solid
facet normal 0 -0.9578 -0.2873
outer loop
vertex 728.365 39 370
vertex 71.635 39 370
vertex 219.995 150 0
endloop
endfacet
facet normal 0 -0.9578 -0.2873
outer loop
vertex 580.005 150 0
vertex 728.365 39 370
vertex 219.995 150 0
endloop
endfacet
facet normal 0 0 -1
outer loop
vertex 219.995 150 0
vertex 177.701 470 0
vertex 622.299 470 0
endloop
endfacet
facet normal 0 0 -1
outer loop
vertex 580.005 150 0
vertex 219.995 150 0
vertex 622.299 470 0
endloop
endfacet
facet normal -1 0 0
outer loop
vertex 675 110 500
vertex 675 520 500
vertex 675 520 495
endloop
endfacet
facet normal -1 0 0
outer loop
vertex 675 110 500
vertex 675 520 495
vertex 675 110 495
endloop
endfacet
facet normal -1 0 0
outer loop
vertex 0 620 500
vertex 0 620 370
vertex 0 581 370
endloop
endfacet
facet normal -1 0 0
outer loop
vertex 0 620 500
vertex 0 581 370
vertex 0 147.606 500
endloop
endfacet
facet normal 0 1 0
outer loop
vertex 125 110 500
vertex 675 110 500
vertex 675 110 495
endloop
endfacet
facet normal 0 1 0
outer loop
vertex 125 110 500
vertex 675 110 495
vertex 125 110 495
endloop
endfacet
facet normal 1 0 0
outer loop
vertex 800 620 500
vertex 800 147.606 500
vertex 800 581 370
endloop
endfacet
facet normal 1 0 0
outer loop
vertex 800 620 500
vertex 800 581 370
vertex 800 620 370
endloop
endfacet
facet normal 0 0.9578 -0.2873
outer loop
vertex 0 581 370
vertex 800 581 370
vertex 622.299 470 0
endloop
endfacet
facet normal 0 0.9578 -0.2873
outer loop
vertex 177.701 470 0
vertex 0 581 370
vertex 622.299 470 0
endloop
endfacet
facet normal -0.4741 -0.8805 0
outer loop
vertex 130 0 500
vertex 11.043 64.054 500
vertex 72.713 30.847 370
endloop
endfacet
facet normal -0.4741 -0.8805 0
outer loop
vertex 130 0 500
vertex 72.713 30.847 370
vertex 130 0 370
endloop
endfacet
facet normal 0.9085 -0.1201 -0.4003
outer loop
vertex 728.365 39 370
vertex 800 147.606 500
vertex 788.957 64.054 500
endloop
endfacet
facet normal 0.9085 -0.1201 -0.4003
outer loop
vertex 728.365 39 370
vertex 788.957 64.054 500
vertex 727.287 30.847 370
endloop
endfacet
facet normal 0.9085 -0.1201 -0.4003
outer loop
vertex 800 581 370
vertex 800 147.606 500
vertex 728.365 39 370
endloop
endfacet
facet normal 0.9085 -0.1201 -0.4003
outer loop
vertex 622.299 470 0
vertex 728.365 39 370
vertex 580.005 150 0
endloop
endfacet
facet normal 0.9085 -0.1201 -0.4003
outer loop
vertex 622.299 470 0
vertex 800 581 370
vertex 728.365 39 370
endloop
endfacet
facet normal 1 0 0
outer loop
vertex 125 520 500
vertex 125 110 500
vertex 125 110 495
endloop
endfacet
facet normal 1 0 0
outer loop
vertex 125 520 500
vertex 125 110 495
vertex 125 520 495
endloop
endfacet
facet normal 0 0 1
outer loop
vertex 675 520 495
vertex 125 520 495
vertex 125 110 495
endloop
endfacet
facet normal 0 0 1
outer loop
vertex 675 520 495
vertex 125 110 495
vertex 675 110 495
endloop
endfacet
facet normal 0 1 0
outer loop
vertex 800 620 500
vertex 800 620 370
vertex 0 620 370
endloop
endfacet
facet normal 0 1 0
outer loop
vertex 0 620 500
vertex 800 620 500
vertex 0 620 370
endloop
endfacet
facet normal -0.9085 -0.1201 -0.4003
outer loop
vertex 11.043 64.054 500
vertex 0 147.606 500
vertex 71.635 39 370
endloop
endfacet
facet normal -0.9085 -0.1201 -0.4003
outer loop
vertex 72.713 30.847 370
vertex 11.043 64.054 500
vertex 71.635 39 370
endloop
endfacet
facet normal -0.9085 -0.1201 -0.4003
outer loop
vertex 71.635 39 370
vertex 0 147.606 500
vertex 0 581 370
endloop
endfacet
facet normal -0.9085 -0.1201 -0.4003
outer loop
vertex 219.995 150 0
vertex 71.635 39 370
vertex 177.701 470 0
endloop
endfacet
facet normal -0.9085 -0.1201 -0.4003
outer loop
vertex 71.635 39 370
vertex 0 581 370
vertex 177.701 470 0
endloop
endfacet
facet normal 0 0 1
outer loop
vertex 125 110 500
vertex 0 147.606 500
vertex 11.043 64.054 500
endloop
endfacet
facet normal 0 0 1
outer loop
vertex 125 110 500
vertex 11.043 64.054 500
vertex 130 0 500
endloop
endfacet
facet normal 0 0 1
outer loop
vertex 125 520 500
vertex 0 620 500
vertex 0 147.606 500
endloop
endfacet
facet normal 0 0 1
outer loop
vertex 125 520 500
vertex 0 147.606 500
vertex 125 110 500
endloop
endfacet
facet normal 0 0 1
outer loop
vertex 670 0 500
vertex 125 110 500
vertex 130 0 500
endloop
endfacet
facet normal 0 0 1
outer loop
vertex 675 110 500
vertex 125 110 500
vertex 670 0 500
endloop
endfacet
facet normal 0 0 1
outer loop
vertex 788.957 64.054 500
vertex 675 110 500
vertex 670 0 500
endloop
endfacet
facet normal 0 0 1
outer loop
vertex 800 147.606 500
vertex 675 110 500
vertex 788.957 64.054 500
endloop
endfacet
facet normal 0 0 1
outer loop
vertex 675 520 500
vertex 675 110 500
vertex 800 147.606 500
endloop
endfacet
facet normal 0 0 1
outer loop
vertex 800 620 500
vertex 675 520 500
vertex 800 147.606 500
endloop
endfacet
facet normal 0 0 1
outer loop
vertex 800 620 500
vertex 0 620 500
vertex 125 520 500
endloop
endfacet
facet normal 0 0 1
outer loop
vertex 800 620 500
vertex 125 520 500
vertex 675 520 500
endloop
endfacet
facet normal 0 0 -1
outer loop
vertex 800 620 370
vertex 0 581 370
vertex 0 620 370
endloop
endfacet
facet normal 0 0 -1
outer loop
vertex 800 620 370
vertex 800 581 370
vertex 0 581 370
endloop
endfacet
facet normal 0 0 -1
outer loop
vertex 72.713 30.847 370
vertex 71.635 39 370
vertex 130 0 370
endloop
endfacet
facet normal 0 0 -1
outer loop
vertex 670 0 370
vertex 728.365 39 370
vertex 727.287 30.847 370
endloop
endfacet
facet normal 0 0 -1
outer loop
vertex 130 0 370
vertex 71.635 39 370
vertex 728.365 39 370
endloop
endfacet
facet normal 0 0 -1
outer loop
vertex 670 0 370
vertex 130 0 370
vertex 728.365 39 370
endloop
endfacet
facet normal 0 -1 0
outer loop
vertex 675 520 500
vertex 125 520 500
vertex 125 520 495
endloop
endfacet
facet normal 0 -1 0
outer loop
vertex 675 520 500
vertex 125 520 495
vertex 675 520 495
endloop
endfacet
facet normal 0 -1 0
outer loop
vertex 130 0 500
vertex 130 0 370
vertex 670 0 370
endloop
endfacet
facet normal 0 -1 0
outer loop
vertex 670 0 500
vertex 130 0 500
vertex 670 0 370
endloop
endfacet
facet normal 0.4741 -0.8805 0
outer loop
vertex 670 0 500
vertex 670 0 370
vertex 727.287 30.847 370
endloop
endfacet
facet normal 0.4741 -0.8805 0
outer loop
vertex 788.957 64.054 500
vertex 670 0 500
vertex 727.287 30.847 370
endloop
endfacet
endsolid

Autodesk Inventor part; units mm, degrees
ref_plane "YZ Plane" through (0, 0, 0) normal (1, 0, 0) x (0, 1, 0)
ref_plane "XZ Plane" through (0, 0, 0) normal (0, 1, 0) x (-1, 0, 0)
ref_plane "XY Plane" through (0, 0, 0) normal (0, 0, 1) x (1, 0, 0)
sketch "Sketch1" plane through (0, 0, 0) normal (0, 0, 1) x (1, 0, 0)
  line L0 (130, 0) -> (670, 0)
  line L1 (800, 70) -> (800, 620)
  line L2 (800, 620) -> (0, 620)
  line L3 (0, 620) -> (0, 70)
  line L4 (0, 70) -> (130, 0)
  line L5 (670, 0) -> (800, 70)
  line L6 (400, 620) -> (400, 0) construction
  point P0 (0, 0)
  dimension "d0" = 800
  dimension "d1" = 620
  dimension "d2" = 550
  dimension "d3" = 550
  dimension "d4" = 270
  dimension "d5" = 270
  dimension "d6" = 70
  dimension "d7" = 70
  dimension "d8" = 130
  dimension "d9" = 130
extrude "Extrusion1" add sketch "Sketch1" along normal blind 500
sketch "Sketch2" plane through (800, 70, 0) normal (1, 0, 0) x (0, 0, -1)
  line L0 (-370, -31) -> (0, 80)
  line L1 (0, 80) -> (0, -70)
  line L2 (0, -70) -> (-370, -70)
  line L3 (0, 550) -> (-500, 550) projected
  line L4 (-370, 511) -> (0, 400)
  line L5 (0, 400) -> (0, 550)
  line L6 (0, 550) -> (-370, 550)
  line L7 (-370, -31) -> (-370, -70)
  line L8 (0, -70) -> (-500, -70) projected
  line L9 (-370, 511) -> (-370, 550)
  line L10 (-500, -70) -> (-500, 0) projected
  line L11 (-500, 0) -> (-500, 550) projected
  dimension "d12" = 320
  dimension "d15" = 150
  dimension "d16" = 150
  dimension "d17" = 130
  dimension "d18" = 130
extrude "Extrusion2" cut sketch "Sketch2" against normal through all
sketch "Sketch3" plane through (0, 0, 500) normal (0, 0, 1) x (1, 0, 0)
  line L0 (125, 520) -> (675, 520)
  line L1 (675, 520) -> (675, 110)
  line L2 (675, 110) -> (125, 110)
  line L3 (125, 110) -> (125, 520)
  line L4 (800, 620) -> (0, 620) projected
  line L5 (0, 150) -> (0, 470) projected
  line L6 (800, 70) -> (800, 620) projected
  point P0 (0, 0)
  dimension "d21" = 100
  dimension "d22" = 125
  dimension "d23" = 125
  dimension "d24" = 40
  dimension "d33" = 550
  dimension "d34" = 410
extrude "Extrusion3" cut sketch "Sketch3" against normal blind 5
sketch "Sketch4" plane through (0, 581, 370) normal (0, 0.9578, -0.2873) x (1, 0, 0)
  line L0 (800, 0) -> (0, 0) projected
  line L1 (800, 0) -> (580, 478.2427)
  line L2 (800, 478.2427) -> (0, 478.2427) projected
  line L3 (0, 0) -> (220, 478.2427)
  line L4 (220, 478.2427) -> (0, 478.2427)
  line L5 (800, -11.2066) -> (0, -11.2066) projected
  line L6 (0, 0) -> (0, 386.2913) projected
  line L7 (0, 478.2427) -> (0, 0)
  line L8 (800, 0) -> (800, 478.2427)
  line L9 (800, 245.8102) -> (800, 22.3174) projected
  line L10 (800, 478.2427) -> (580, 478.2427)
  point P0 (0, 521.3448)
  dimension "d27" = 360
  dimension "d28" = 220
  dimension "d30" = 220
extrude "Extrusion4" cut sketch "Sketch4" against normal through all contours L1 L2 L8 | L6 L7 L2 L3
properties part number "TV" material "ABS Plastic"
